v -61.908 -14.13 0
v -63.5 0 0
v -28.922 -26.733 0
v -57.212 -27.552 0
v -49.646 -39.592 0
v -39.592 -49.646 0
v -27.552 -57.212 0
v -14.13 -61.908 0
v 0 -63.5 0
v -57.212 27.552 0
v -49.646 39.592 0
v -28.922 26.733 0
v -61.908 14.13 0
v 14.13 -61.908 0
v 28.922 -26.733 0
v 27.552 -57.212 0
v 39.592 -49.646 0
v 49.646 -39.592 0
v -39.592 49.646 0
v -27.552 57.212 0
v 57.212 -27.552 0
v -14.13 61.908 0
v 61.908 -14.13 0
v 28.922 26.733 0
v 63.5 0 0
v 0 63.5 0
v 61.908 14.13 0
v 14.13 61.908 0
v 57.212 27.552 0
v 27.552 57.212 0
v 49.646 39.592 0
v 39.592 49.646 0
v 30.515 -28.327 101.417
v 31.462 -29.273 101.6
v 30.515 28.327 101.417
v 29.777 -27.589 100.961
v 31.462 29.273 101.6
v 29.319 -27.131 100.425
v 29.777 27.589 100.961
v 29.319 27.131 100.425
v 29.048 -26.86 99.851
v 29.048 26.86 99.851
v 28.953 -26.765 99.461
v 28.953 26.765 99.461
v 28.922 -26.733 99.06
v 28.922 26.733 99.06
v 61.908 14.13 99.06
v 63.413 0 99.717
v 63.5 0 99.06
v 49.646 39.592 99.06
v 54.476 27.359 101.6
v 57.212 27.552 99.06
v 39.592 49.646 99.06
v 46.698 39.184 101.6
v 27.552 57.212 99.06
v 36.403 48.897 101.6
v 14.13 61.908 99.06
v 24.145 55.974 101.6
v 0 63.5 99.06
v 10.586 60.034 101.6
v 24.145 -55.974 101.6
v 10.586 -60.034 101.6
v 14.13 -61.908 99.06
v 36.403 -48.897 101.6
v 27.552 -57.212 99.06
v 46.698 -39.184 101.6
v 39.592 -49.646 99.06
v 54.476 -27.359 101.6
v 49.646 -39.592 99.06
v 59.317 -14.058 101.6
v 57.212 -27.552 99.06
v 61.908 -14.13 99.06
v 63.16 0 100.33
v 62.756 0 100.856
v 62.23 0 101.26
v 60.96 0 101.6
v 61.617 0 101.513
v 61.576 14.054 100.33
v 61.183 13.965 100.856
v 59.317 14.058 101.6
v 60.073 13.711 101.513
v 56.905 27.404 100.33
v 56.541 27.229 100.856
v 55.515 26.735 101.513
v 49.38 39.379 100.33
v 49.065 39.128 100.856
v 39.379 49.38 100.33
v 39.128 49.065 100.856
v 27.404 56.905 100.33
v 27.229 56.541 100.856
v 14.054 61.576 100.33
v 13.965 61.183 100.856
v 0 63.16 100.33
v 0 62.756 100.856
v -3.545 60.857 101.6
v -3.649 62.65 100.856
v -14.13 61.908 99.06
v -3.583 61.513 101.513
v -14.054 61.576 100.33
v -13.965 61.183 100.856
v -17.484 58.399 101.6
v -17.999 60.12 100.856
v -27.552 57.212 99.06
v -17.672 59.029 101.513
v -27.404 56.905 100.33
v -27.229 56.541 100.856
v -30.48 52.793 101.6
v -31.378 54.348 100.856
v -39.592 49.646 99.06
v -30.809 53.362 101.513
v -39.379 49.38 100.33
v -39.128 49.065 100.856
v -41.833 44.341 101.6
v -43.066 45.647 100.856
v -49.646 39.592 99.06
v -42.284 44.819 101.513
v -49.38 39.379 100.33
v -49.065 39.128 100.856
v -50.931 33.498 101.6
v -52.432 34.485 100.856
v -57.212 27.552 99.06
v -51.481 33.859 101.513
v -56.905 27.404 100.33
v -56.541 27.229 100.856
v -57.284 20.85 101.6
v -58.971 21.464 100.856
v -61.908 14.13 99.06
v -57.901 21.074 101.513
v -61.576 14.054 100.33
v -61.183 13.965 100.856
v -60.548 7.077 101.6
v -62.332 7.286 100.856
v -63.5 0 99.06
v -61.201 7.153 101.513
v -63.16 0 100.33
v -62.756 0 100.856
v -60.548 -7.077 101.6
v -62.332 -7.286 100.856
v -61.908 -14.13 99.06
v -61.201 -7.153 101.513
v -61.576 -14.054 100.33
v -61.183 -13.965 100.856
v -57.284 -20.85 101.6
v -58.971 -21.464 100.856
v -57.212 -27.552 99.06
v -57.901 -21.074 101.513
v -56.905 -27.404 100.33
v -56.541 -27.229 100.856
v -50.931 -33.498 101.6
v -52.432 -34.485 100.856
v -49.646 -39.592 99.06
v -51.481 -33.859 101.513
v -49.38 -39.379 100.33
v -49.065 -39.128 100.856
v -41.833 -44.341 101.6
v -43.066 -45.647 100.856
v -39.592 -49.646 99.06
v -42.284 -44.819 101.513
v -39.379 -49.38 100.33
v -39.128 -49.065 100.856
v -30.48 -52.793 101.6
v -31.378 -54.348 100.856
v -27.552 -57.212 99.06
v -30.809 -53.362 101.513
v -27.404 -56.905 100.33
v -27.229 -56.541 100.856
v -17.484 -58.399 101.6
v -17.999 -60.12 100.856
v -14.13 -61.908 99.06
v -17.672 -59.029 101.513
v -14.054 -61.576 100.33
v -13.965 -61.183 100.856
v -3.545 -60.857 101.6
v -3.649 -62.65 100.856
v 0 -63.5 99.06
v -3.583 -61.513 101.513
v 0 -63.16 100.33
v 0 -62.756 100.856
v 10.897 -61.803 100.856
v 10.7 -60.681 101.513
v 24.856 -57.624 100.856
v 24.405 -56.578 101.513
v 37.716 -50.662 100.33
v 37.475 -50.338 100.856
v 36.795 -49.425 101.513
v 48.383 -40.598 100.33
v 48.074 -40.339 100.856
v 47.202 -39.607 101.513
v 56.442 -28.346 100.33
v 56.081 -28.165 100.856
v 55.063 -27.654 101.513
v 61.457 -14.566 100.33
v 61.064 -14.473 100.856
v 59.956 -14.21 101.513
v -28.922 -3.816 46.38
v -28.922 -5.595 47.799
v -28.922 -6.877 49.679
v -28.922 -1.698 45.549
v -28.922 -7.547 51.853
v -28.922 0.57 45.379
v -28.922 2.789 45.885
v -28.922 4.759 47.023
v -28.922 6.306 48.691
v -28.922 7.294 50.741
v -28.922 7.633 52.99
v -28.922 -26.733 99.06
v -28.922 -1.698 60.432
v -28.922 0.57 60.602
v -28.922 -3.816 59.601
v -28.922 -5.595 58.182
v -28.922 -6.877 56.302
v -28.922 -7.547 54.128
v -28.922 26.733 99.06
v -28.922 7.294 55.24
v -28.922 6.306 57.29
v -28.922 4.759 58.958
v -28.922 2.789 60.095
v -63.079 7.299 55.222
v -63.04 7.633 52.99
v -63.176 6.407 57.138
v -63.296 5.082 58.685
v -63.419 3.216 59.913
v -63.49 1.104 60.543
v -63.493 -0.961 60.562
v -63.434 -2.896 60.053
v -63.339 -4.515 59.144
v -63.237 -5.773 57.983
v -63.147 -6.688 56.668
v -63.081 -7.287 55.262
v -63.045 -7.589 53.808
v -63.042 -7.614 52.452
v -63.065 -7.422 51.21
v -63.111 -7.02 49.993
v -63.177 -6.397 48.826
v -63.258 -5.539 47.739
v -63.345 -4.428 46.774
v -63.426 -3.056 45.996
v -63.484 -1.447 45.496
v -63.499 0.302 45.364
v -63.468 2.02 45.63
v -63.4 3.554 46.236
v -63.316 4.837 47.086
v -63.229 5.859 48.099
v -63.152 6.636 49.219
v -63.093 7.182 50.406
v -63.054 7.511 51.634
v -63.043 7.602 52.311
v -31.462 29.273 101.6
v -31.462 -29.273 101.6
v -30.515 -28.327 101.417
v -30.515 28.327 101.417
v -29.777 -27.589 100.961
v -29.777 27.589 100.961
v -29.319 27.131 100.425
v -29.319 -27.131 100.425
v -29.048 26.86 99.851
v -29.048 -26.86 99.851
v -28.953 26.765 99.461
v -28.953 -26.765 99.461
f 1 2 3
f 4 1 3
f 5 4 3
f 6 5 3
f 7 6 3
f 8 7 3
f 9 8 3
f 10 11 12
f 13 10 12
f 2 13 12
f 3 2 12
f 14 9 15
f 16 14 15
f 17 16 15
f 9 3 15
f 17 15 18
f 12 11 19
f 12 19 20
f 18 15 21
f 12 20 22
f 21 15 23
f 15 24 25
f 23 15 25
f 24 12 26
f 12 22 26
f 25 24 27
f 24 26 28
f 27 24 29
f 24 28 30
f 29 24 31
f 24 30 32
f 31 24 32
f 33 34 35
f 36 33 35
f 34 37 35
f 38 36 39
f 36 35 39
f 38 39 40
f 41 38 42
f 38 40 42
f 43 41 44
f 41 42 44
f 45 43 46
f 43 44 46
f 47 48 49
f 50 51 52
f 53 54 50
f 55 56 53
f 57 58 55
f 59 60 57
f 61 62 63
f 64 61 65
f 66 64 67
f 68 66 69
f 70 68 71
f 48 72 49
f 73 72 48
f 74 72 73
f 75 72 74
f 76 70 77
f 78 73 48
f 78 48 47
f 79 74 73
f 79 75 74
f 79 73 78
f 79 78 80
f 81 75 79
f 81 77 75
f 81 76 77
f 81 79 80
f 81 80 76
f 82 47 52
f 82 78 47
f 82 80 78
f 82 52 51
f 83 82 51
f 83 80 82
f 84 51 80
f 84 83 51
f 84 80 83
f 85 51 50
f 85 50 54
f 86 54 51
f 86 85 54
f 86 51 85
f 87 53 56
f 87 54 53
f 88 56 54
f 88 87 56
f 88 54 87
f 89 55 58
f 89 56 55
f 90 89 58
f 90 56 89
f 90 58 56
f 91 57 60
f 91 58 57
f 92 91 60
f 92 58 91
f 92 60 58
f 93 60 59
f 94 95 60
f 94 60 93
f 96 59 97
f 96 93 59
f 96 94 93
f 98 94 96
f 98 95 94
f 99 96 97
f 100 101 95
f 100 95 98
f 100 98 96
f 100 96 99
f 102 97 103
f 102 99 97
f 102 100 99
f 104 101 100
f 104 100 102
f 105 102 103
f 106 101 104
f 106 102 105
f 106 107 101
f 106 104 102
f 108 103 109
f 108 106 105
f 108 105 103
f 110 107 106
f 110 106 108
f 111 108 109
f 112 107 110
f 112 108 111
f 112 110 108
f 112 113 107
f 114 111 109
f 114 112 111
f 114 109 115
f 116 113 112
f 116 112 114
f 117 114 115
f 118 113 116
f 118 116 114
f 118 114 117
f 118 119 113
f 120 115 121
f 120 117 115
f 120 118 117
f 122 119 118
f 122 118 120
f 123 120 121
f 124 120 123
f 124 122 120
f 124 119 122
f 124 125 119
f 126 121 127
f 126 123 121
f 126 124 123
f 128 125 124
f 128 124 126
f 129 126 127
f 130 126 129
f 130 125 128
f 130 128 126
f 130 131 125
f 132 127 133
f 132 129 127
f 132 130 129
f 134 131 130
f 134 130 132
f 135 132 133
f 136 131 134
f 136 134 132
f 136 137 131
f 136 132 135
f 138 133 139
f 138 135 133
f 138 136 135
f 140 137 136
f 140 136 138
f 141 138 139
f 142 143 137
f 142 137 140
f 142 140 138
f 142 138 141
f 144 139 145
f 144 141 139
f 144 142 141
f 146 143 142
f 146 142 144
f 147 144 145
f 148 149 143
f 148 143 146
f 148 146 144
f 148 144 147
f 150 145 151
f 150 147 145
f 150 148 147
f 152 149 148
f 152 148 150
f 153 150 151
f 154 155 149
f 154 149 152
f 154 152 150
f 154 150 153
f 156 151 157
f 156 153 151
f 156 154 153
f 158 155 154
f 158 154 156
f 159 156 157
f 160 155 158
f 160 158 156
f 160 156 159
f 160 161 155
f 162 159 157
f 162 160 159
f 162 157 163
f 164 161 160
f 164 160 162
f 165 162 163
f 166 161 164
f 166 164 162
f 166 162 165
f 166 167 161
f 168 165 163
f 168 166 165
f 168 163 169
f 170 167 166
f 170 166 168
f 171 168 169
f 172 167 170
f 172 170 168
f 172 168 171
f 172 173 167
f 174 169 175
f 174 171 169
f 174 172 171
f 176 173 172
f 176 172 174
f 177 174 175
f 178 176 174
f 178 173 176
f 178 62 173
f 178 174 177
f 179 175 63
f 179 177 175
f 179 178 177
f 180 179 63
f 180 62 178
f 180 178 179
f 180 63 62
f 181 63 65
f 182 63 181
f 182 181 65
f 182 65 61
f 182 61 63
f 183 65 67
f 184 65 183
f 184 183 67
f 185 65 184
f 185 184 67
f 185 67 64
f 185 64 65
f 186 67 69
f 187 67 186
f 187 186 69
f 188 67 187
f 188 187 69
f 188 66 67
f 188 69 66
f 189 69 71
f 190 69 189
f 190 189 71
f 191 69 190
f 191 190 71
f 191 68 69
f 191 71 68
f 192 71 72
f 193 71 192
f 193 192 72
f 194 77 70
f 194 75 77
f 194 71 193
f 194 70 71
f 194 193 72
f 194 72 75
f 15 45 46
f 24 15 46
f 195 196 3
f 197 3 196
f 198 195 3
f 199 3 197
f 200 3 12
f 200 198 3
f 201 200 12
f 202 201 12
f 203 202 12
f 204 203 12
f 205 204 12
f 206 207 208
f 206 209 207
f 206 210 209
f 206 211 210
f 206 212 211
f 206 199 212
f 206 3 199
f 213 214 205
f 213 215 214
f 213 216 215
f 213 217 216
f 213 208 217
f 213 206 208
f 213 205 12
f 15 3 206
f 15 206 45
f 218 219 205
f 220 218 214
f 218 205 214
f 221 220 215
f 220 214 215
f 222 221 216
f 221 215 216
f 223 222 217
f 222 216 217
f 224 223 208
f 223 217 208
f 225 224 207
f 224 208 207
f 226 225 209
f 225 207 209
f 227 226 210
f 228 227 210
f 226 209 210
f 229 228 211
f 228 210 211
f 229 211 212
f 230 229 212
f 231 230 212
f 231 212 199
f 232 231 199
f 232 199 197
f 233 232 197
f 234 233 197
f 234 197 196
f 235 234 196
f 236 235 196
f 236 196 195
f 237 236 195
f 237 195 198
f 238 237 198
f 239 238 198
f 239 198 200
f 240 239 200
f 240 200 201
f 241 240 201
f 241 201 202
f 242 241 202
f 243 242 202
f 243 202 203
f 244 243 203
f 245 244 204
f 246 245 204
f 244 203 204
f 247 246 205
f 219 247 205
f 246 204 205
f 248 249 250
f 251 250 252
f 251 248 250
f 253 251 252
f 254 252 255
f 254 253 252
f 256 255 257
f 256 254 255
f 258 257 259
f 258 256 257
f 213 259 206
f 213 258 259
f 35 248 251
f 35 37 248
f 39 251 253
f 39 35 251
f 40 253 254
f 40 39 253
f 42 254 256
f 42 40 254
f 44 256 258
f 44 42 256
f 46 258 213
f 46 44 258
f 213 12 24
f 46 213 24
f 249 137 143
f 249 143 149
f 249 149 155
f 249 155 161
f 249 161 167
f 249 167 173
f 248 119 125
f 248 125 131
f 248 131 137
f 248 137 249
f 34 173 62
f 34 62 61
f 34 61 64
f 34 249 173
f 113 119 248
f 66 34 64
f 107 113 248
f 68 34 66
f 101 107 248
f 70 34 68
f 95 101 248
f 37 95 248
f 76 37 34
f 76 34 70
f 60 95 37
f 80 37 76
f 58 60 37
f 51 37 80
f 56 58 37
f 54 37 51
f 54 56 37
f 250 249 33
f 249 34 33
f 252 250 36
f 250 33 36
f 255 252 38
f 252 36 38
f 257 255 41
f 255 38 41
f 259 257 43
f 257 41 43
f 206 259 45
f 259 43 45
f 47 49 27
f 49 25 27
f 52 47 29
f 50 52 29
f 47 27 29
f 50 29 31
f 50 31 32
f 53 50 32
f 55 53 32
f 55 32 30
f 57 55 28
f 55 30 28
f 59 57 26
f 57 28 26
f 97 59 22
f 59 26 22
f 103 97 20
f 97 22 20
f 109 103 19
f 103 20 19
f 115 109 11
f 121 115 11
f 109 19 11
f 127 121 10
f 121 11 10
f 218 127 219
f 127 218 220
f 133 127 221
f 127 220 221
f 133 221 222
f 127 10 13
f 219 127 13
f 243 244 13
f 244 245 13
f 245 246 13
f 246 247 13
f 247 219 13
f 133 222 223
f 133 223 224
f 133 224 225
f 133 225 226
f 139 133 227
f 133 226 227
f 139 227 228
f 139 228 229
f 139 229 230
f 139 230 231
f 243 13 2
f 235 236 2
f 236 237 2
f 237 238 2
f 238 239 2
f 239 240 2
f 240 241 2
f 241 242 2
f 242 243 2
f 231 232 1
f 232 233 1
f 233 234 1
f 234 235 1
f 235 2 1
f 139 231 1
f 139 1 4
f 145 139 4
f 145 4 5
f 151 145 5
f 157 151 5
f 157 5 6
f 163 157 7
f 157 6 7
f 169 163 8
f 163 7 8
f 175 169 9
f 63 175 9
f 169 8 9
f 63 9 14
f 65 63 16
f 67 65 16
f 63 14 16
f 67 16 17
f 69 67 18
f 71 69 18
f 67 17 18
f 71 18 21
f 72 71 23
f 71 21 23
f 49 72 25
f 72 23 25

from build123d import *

# Parameters (mm, degrees)
F0_R     = 63.5
F1_DEPTH = 101.6
F2_W     = 57.8431412578
F2_H     = 53.4668527544
F3_DEPTH = 190.5
F4_R     = 2.54
F5_R     = 7.6327
F6_DEPTH = 57.912


with BuildPart() as f1:
    # F0 (on Top) → F1 (new body)
    with BuildSketch(Plane.XY):
        Circle(F0_R)
    extrude(amount=F1_DEPTH)

    # F2 (on face) → F3 (cut)
    with BuildSketch(Plane.XY.offset(101.6)):
        Rectangle(F2_W, F2_H)
    extrude(amount=-F3_DEPTH, mode=Mode.SUBTRACT)

    # F4
    f4_edges = [f1.edges().sort_by_distance(p)[0] for p in [
        (-63.5, 0, 101.6),
        (0, -26.733426, 101.6),
        (28.921571, 0, 101.6),
        (0, 26.733426, 101.6),
        (-28.921571, 0, 101.6),
    ]]
    fillet(f4_edges, radius=F4_R)

    # F5 (on face) → F6 (cut)
    with BuildSketch(Plane.YZ.offset(-28.9215706289)):
        with Locations((0, 52.9904067516)):
            Circle(F5_R)
    extrude(amount=-F6_DEPTH, mode=Mode.SUBTRACT)


solid = f1.part
